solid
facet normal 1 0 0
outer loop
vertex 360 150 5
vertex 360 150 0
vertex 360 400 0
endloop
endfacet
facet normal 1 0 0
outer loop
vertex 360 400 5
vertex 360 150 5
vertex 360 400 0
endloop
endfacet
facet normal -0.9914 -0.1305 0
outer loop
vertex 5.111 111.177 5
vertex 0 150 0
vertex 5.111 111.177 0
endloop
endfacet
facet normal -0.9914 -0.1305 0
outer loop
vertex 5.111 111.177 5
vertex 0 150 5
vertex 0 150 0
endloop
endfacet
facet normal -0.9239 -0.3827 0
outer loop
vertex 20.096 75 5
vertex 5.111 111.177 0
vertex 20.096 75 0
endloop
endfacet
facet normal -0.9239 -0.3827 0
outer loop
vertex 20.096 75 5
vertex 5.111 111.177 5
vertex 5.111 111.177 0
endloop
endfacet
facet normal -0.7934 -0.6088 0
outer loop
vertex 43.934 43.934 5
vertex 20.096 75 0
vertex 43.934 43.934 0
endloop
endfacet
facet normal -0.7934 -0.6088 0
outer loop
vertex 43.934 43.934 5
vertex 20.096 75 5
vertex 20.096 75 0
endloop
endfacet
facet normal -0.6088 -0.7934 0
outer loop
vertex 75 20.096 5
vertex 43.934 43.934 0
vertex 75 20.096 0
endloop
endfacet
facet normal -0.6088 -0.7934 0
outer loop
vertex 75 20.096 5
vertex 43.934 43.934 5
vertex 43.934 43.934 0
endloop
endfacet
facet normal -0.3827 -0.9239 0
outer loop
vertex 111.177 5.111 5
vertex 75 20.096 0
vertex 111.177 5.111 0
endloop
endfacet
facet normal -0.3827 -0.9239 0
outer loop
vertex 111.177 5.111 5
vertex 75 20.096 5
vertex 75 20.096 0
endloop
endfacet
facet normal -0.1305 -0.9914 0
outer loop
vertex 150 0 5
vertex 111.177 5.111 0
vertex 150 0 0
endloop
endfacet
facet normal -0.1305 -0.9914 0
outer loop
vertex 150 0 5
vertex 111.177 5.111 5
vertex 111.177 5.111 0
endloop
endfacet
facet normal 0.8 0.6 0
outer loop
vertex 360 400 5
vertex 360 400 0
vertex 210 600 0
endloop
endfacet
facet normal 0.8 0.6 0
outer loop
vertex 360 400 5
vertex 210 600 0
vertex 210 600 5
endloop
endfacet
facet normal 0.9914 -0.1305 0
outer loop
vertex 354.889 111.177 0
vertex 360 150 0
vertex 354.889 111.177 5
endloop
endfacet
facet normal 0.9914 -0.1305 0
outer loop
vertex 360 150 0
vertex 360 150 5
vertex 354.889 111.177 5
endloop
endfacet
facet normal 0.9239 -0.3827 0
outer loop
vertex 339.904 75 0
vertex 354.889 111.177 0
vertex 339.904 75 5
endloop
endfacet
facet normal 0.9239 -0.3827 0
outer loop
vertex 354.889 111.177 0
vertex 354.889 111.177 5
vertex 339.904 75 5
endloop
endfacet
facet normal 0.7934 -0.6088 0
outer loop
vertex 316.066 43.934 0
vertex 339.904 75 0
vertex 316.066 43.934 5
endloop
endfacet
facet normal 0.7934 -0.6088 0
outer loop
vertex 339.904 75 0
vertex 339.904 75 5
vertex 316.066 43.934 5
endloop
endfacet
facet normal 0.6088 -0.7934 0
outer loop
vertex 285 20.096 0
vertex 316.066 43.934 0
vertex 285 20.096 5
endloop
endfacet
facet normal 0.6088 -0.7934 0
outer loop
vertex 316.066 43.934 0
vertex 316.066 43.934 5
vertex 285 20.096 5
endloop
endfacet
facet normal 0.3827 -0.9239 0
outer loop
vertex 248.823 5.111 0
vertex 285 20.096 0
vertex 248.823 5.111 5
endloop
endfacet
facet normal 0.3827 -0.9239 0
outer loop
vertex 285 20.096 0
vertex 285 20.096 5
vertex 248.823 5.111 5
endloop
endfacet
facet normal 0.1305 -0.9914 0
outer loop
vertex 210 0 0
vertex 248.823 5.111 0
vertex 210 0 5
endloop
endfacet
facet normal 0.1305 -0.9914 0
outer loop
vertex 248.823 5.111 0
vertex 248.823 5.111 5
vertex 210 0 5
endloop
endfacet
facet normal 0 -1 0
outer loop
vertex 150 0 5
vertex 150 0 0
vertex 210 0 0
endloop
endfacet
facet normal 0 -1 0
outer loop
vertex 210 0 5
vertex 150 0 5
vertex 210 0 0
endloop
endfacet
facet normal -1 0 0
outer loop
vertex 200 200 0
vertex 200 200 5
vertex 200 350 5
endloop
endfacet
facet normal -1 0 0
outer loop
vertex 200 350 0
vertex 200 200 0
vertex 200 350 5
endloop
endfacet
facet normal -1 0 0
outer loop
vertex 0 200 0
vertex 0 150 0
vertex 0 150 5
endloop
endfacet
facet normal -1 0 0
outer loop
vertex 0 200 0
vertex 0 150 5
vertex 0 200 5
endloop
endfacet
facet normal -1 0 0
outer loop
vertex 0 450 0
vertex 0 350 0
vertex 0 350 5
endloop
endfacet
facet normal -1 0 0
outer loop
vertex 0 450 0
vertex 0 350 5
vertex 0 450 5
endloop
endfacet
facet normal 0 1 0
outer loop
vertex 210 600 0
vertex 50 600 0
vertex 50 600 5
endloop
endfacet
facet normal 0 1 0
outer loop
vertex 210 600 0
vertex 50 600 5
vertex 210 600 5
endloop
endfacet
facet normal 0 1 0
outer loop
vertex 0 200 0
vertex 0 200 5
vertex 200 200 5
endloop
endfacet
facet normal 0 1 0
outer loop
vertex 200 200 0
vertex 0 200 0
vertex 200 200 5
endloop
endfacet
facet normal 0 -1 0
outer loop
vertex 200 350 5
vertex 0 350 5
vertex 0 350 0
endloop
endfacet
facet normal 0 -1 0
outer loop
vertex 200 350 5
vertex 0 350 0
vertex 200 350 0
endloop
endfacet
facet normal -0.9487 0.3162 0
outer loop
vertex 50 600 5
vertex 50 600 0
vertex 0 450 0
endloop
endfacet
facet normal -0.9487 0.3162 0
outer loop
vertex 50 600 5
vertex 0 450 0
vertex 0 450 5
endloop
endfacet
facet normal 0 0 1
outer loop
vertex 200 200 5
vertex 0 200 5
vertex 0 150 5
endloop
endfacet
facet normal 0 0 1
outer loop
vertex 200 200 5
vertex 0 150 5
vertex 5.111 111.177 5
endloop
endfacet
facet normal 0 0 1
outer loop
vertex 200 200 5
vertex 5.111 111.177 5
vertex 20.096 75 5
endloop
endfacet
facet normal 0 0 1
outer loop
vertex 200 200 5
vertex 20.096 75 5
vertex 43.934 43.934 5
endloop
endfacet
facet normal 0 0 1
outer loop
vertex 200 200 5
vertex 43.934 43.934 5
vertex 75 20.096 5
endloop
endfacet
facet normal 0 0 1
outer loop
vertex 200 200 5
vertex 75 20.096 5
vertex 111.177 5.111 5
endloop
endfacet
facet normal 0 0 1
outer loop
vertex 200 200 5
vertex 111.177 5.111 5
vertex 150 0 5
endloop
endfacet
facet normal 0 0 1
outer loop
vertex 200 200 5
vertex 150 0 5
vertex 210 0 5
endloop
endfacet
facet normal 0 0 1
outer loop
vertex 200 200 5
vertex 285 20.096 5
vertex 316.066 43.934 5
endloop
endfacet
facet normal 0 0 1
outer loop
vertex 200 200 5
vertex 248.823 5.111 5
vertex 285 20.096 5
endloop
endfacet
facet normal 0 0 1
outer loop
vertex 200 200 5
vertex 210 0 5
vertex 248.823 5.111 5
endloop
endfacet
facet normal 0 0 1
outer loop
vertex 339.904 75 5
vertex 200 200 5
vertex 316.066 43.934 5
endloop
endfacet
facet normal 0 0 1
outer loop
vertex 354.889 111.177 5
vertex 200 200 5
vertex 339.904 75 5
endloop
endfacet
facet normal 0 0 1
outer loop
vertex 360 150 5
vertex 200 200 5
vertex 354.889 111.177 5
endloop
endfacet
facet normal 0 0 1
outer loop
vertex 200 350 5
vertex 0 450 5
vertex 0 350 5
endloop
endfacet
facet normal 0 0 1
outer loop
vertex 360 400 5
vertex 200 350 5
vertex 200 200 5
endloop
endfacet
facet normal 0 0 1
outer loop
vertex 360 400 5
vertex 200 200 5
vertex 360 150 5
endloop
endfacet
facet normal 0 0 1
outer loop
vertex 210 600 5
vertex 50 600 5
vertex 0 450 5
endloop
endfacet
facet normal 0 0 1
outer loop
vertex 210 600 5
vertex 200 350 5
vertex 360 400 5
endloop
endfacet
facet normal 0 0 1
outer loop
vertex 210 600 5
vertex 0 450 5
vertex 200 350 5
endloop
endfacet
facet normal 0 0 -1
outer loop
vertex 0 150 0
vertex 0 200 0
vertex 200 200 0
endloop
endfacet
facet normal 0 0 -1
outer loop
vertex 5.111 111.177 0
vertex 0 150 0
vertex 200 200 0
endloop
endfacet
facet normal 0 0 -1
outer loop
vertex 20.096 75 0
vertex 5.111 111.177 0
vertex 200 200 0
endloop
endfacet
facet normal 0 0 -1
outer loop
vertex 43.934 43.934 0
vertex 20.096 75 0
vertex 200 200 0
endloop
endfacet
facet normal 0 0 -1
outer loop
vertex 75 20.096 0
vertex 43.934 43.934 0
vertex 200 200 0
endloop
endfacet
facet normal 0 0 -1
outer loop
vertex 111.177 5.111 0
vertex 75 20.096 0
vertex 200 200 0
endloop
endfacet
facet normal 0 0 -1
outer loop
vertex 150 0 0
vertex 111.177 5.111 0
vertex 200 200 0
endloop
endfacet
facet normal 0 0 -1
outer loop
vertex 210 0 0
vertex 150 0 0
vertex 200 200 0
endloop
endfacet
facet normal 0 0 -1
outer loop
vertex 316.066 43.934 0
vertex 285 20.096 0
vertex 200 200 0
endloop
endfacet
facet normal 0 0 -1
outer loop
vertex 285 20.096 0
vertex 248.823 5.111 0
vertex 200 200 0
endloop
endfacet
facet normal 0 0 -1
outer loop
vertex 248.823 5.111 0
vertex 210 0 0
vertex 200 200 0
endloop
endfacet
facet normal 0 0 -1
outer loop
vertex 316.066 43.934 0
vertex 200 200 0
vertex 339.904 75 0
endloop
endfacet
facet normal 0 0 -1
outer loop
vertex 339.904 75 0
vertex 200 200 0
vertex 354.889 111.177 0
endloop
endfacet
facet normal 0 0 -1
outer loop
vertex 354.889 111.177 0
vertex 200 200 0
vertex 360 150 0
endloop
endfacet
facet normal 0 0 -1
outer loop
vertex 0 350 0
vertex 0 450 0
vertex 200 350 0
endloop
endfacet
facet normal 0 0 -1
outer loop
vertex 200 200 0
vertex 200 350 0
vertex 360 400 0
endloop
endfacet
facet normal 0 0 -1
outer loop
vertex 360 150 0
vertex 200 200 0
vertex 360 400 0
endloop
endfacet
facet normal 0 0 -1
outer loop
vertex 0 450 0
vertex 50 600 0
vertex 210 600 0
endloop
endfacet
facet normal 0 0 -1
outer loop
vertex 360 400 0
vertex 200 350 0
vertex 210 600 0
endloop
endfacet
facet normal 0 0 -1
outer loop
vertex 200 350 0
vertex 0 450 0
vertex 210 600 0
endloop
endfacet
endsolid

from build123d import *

# Parameters (mm, degrees)
F0_W     = 360
F0_H     = 600
F1_DEPTH = 5
F2_W     = 200
F2_H     = 150
F3_DEPTH = 25
F4_R     = 150
F5_SIZE2 = 50
F5_SIZE  = 150
F6_SIZE2 = 200
F6_SIZE  = 150
F7_R     = 150


with BuildPart() as f1:
    # F0 (on Top) → F1 (new body)
    with BuildSketch(Plane.XY):
        with Locations((180, 300)):
            Rectangle(F0_W, F0_H)
    extrude(amount=F1_DEPTH)

    # F2 (on face) → F3 (cut)
    with BuildSketch(Plane.XY.offset(5)):
        with Locations((100, 275)):
            Rectangle(F2_W, F2_H)
    extrude(amount=-F3_DEPTH, mode=Mode.SUBTRACT)

    # F4
    f4_edges = [f1.edges().sort_by_distance(p)[0] for p in [
        (0, 0, 2.5),
    ]]
    fillet(f4_edges, radius=F4_R)

    # F5
    f5_edges = [f1.edges().sort_by_distance(p)[0] for p in [
        (0, 600, 2.5),
    ]]
    f5_side = f1.faces().sort_by_distance((0, 475, 2.5))[0]
    chamfer(f5_edges, length=F5_SIZE, length2=F5_SIZE2, reference=f5_side)

    # F6
    f6_edges = [f1.edges().sort_by_distance(p)[0] for p in [
        (360, 600, 2.5),
    ]]
    f6_side = f1.faces().sort_by_distance((205, 600, 2.5))[0]
    chamfer(f6_edges, length=F6_SIZE, length2=F6_SIZE2, reference=f6_side)

    # F7
    f7_edges = [f1.edges().sort_by_distance(p)[0] for p in [
        (360, 0, 2.5),
    ]]
    fillet(f7_edges, radius=F7_R)


solid = f1.part
